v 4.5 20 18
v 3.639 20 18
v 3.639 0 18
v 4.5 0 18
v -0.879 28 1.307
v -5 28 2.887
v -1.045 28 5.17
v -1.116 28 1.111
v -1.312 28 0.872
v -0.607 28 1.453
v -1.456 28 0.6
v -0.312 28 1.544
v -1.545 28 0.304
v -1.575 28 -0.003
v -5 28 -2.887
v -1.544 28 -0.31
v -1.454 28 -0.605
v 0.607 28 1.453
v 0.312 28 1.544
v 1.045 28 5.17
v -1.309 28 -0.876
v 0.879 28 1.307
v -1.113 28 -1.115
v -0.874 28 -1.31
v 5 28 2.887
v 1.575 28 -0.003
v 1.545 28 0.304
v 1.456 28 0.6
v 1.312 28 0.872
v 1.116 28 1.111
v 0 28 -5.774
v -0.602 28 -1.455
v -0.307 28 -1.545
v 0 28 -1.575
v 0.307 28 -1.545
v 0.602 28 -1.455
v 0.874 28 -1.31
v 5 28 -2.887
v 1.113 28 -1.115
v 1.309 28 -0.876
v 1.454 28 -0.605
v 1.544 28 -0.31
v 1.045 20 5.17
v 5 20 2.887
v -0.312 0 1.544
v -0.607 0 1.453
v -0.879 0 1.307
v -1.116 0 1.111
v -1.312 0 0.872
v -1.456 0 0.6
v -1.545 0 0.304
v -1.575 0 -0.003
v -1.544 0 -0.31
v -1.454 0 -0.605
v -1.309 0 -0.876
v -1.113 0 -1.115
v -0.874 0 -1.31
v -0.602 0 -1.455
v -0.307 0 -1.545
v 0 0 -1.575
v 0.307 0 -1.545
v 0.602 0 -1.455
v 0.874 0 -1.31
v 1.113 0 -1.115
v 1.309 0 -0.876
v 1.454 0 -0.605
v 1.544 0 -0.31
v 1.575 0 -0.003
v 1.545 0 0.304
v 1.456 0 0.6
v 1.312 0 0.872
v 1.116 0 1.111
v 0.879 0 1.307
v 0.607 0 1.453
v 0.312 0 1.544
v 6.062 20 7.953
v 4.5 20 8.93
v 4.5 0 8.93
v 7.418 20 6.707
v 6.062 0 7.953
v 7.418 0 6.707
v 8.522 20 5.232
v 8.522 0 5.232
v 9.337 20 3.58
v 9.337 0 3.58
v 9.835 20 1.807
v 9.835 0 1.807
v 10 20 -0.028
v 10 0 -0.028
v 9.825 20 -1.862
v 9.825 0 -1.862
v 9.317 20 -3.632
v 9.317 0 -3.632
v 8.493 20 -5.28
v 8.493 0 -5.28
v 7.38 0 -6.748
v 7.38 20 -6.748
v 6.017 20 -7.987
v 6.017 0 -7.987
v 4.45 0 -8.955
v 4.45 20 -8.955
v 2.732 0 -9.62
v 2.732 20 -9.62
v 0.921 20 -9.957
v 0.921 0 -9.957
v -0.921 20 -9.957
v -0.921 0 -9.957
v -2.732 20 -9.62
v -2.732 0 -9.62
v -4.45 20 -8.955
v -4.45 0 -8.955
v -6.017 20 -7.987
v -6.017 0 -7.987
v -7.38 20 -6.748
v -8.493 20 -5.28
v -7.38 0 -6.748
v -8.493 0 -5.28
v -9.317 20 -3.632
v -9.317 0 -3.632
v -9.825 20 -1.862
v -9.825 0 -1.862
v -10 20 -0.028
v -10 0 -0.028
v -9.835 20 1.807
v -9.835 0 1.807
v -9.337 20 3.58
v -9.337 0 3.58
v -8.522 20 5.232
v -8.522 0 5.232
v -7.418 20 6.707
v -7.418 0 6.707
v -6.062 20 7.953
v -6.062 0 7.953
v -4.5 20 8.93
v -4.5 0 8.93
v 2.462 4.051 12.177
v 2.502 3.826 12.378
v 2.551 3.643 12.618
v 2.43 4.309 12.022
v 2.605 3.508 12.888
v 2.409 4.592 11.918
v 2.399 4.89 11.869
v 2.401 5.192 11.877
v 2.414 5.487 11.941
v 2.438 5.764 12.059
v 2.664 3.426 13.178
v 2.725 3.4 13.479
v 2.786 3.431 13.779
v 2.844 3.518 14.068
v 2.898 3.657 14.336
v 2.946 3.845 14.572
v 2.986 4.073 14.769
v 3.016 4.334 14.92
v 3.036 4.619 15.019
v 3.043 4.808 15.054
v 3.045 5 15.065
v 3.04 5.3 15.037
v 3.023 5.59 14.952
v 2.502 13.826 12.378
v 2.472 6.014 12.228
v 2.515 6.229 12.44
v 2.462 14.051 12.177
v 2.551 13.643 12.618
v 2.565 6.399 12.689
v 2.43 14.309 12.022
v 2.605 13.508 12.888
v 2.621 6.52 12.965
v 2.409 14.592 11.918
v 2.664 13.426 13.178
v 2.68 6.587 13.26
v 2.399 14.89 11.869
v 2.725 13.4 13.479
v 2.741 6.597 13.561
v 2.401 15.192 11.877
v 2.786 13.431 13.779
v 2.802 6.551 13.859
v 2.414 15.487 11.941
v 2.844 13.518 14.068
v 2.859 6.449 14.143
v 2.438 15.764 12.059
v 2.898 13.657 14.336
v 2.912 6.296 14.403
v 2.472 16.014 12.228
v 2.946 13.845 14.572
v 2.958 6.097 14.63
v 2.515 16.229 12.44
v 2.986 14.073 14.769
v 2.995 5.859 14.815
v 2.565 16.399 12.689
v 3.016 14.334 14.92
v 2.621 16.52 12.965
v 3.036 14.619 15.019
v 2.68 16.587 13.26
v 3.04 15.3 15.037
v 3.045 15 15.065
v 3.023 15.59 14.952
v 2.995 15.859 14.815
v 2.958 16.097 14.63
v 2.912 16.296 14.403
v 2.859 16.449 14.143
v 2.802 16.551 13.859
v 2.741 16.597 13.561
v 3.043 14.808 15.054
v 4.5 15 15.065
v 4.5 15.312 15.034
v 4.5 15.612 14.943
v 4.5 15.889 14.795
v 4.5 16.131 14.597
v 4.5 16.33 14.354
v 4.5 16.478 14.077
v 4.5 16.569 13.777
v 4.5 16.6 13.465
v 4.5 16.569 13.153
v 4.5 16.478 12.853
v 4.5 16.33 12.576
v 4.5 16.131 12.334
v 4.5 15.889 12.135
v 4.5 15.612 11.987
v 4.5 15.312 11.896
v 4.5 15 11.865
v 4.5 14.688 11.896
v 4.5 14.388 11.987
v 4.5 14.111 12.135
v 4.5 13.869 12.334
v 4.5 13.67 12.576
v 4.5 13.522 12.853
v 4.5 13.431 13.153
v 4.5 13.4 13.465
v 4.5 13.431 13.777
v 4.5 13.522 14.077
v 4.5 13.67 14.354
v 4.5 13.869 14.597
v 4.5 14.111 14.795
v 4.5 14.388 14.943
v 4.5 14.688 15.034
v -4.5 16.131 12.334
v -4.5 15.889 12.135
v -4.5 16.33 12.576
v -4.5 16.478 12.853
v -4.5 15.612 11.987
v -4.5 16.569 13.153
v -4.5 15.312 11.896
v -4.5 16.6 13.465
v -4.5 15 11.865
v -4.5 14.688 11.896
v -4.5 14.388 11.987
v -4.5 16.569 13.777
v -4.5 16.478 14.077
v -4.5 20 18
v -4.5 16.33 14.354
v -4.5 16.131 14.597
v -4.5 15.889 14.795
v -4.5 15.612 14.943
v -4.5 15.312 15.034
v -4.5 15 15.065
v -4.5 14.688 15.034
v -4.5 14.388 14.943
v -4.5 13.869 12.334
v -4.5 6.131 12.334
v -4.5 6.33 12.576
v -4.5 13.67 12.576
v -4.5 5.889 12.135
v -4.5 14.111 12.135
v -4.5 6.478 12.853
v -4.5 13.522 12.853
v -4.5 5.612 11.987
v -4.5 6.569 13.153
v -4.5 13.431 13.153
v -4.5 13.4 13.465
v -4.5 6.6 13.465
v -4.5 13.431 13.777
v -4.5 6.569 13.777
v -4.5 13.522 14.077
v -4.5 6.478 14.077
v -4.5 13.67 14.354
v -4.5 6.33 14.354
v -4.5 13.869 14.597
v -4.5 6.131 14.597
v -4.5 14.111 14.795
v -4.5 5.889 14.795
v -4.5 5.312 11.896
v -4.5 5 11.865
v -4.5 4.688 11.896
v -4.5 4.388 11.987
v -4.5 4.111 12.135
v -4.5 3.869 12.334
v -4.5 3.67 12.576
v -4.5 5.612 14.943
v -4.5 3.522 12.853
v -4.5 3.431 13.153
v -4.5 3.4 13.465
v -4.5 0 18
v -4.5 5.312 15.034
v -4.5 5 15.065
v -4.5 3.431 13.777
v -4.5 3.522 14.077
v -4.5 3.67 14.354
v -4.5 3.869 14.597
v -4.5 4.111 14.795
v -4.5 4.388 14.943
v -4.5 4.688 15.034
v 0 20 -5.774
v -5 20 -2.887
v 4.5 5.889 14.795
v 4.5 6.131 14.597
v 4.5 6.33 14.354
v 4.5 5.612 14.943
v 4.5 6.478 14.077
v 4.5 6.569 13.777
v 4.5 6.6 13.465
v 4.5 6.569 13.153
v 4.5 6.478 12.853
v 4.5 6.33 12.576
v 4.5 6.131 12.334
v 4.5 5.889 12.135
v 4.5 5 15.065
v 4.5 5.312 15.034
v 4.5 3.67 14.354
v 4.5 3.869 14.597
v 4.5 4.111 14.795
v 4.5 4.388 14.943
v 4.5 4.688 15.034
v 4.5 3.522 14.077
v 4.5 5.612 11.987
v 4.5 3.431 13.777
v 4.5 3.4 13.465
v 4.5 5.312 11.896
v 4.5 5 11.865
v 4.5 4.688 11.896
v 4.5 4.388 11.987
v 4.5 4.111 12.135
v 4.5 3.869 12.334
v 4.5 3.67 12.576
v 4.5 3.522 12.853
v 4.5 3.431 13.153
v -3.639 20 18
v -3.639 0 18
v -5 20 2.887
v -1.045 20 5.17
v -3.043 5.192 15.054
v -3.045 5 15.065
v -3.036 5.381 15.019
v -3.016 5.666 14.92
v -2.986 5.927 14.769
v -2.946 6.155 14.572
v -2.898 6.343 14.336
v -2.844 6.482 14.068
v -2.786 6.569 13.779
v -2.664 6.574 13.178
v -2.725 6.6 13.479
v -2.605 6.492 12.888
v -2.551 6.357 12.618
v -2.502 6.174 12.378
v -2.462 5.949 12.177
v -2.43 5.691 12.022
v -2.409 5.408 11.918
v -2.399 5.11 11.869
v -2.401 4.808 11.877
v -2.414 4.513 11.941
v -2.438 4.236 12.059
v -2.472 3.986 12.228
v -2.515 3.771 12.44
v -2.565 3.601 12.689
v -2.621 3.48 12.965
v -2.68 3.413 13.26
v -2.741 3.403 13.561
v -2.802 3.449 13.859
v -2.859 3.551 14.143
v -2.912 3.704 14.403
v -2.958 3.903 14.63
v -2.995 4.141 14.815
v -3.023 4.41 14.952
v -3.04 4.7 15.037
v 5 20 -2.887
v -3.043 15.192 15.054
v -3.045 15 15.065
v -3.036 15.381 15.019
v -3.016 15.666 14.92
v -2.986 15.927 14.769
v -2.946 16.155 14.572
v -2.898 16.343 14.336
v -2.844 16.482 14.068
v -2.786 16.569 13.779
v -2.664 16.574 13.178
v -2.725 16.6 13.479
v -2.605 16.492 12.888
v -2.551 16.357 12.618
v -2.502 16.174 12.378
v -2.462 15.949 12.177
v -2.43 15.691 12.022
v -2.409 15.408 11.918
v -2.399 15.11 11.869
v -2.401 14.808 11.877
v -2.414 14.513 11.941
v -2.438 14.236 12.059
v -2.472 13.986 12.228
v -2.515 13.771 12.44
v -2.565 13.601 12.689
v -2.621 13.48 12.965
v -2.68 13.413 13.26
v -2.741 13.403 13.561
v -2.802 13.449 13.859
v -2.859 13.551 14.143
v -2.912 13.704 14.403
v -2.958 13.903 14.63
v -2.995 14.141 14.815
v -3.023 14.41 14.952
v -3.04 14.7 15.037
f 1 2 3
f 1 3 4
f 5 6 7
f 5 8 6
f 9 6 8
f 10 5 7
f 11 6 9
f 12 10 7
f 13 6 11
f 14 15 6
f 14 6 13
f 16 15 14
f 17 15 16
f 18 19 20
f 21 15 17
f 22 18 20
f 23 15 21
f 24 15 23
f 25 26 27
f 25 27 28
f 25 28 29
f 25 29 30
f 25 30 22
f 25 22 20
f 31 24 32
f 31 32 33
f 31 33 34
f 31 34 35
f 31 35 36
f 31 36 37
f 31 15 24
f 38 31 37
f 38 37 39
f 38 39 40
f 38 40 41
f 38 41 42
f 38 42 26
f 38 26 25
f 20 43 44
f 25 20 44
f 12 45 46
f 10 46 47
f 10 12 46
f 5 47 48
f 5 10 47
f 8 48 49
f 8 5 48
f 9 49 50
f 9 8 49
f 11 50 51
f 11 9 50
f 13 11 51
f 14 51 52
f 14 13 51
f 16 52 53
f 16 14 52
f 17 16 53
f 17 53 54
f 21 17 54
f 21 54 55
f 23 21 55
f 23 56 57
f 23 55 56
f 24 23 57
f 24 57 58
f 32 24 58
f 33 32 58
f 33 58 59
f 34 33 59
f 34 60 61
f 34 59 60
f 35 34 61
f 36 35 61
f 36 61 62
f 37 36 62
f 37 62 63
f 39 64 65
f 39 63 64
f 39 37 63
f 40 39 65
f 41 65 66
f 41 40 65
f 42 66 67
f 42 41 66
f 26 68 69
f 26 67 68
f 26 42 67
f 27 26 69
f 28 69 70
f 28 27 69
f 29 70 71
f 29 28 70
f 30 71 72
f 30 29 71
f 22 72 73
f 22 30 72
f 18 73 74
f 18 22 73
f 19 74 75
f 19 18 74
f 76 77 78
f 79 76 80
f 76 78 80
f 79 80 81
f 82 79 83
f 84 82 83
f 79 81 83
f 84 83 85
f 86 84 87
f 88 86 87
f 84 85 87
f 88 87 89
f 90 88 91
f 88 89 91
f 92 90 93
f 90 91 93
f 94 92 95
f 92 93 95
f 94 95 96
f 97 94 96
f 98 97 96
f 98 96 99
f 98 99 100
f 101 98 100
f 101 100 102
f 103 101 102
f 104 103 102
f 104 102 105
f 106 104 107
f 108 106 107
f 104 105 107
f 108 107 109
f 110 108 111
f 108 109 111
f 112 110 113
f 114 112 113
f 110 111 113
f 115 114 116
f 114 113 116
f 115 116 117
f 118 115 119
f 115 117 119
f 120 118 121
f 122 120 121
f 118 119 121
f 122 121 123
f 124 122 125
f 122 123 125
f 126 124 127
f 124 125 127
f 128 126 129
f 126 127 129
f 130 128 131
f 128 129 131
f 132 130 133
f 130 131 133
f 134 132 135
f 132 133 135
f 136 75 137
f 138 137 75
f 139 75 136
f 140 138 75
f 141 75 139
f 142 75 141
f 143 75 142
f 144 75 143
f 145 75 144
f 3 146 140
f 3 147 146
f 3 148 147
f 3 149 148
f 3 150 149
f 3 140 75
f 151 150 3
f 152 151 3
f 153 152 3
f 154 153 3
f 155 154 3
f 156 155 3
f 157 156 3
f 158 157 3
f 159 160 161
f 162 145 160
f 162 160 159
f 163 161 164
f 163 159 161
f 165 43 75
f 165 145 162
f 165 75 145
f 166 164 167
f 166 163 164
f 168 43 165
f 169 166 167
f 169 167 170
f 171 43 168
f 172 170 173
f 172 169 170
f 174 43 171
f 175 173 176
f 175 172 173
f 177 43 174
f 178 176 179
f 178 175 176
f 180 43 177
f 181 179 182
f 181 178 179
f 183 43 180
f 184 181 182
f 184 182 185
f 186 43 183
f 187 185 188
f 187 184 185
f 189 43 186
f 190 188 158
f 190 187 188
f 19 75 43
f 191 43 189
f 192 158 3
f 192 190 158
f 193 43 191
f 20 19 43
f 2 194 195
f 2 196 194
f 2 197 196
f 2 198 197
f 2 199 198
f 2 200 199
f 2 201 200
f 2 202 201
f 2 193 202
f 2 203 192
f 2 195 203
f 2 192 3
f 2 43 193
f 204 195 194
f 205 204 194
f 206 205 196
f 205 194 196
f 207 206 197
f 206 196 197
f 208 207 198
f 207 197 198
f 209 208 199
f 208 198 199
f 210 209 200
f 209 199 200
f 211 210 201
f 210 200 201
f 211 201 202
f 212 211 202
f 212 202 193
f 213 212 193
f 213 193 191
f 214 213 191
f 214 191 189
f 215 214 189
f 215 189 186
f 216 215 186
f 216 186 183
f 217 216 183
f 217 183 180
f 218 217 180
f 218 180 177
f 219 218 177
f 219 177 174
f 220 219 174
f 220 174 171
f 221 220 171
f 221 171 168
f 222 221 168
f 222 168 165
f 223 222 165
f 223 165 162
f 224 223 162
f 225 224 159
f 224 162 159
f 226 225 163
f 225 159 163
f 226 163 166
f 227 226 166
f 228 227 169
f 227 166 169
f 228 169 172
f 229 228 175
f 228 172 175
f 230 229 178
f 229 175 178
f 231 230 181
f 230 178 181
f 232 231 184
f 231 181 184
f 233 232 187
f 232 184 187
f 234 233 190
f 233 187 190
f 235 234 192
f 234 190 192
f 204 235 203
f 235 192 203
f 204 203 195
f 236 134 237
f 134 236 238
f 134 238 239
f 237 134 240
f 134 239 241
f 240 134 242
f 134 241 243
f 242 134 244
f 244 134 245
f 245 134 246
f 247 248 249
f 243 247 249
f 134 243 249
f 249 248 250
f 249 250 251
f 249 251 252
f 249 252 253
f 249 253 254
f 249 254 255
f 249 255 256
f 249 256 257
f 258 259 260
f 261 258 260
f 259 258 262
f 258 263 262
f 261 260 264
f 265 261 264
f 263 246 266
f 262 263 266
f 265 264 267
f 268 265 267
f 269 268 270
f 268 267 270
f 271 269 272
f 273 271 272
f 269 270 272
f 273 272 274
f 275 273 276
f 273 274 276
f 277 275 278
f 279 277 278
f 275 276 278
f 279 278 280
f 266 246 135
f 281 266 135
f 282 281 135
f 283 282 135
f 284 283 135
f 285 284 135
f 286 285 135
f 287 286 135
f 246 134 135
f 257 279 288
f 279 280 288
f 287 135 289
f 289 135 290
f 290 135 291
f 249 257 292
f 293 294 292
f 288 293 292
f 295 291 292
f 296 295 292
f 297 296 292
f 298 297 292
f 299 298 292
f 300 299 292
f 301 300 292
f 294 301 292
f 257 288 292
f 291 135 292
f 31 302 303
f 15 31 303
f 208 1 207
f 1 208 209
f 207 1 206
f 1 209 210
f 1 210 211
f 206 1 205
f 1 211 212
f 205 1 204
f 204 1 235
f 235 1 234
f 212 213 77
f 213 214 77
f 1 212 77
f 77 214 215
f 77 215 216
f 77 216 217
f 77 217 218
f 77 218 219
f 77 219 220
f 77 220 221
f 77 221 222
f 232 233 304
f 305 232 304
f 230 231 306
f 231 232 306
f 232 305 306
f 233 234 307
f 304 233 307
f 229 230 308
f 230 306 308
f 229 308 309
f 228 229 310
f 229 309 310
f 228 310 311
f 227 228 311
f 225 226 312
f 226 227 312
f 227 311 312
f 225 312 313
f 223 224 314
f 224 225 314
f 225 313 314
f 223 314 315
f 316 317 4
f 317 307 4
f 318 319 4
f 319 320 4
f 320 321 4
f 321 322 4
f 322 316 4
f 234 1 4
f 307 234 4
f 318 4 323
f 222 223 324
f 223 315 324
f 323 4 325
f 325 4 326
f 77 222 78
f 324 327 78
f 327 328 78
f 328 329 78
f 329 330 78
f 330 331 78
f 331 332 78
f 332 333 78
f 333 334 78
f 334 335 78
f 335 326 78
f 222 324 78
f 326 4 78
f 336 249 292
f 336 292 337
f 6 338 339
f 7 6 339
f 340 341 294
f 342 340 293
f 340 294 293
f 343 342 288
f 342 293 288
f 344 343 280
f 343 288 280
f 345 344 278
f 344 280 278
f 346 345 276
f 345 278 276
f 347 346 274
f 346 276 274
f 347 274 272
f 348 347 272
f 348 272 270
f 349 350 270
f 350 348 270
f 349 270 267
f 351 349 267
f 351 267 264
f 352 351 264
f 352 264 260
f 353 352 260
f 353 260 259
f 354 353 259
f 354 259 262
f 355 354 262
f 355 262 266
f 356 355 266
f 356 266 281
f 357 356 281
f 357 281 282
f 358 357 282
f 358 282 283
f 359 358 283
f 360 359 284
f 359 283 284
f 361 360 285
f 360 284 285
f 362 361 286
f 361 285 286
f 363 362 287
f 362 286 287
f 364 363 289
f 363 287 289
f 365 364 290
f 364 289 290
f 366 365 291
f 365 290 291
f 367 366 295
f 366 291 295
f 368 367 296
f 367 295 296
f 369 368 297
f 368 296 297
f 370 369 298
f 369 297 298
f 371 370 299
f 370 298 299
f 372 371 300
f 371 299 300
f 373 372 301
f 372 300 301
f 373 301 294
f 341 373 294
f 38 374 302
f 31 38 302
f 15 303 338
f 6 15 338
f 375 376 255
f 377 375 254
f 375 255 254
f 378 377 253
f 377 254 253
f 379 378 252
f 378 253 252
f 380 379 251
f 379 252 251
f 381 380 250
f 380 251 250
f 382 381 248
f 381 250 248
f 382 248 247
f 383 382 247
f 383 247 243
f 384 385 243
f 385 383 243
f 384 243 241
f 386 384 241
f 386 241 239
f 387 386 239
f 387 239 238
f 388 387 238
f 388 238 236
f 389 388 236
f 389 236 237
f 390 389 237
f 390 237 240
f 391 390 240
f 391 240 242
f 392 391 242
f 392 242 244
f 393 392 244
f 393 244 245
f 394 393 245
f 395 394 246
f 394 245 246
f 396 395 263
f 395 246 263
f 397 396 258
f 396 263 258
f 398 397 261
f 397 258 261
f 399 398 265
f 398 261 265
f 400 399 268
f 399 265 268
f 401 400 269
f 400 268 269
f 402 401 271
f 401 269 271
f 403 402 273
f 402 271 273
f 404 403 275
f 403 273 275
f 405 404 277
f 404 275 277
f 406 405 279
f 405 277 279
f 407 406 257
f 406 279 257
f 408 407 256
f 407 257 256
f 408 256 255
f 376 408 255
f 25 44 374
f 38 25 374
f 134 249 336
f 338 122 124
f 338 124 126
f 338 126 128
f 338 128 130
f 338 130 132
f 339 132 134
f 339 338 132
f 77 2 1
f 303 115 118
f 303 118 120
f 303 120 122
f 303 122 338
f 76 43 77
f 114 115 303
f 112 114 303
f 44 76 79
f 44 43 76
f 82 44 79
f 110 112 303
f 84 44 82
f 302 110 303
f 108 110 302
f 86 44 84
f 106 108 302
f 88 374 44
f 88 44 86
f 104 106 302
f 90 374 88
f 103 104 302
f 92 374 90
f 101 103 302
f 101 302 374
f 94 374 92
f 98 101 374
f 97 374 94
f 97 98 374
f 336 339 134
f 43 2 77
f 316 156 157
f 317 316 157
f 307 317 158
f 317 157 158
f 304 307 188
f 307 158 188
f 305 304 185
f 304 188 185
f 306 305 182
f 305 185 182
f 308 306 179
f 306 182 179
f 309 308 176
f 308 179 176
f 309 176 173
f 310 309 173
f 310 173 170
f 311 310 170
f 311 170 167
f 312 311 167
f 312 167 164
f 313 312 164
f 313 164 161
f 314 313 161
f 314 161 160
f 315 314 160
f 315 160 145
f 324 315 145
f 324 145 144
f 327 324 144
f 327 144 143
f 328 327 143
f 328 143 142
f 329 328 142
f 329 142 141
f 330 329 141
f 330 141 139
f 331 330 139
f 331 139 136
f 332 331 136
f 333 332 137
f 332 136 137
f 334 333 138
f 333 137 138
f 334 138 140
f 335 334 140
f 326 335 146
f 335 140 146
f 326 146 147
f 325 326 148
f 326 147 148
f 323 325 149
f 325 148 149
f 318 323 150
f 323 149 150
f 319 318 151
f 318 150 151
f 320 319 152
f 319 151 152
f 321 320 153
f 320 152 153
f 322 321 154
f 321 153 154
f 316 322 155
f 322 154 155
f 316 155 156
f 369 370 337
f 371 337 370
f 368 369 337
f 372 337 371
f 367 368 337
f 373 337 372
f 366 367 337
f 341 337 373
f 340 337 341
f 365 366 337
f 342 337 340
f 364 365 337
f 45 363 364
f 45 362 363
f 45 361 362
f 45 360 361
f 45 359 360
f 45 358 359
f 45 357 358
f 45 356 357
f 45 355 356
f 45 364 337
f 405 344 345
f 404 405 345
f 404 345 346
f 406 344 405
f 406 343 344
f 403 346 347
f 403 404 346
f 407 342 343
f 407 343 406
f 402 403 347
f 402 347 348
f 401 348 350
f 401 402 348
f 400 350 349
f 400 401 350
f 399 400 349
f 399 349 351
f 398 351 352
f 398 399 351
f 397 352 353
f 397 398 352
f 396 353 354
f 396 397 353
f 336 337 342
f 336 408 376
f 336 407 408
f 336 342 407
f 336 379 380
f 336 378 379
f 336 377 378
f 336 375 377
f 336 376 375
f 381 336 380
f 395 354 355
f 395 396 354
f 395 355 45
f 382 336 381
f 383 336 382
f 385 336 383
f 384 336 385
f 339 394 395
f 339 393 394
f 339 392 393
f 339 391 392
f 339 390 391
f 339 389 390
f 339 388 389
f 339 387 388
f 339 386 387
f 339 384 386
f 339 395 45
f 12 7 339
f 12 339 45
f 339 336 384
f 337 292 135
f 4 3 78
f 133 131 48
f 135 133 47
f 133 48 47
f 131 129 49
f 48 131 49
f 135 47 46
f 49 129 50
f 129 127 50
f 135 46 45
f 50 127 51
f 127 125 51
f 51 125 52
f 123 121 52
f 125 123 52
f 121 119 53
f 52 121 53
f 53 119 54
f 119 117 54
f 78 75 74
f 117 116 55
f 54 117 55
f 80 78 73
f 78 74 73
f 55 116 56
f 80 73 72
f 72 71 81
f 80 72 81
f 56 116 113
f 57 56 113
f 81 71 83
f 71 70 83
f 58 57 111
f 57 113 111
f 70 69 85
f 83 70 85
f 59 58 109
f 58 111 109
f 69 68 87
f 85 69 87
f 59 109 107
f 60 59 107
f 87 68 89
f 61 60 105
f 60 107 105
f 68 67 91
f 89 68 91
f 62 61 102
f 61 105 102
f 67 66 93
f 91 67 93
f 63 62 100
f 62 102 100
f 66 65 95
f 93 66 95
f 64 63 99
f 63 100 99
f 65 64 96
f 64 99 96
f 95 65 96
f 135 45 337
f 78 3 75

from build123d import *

# Parameters (mm, degrees)
EXTRUDE_1_DEPTH     = 20
EXTRUDE_2_DEPTH     = 8
CUT_EXTRUDE_1_DEPTH = 35.756294394
SKETCH_4_R          = 1.6
CUT_EXTRUDE_2_DEPTH = 37.307712679


with BuildPart() as part:
    # ｽｹｯﾁ1 → ﾎﾞｽ - 押し出し1 (new body)
    with BuildSketch(Plane(origin=(0, 0, 0), x_dir=(1, 0, 0), z_dir=(0, 1, 0))):
        with BuildLine():
            Line((-4.5, -8.93028555), (-4.5, -18))
            Line((-4.5, -18), (4.5, -18))
            Line((4.5, -18), (4.5, -8.93028555))
            ThreePointArc((4.5, -8.93028555), (0, 10), (-4.5, -8.93028555))
        make_face()
    extrude(amount=EXTRUDE_1_DEPTH)

    # ｽｹｯﾁ2 → ﾎﾞｽ - 押し出し2 (add)
    with BuildSketch(Plane(origin=(0, 20, 0), x_dir=(1, 0, 0), z_dir=(0, 1, 0))):
        Polygon((0, 5.773502692), (-5, 2.886751346), (-5, -2.886751346), (0, -5.773502692), (5, -2.886751346), (5, 2.886751346), align=None)
    extrude(amount=EXTRUDE_2_DEPTH)

    # ｽｹｯﾁ3 → ｶｯﾄ - 押し出し1 (cut, through all)
    with BuildSketch(Plane(origin=(0, 28, 0), x_dir=(1, 0, 0), z_dir=(0, 1, 0))):
        with BuildLine():
            Line((-3.638778503, -18), (-0.312080176, -1.543771668))
            ThreePointArc((-0.312080176, -1.543771668), (0, 1.575), (0.312080176, -1.543771668))
            Line((0.312080176, -1.543771668), (3.638778503, -18))
            ThreePointArc((3.638778503, -18), (0, -18.364114708), (-3.638778503, -18))
        make_face()
    extrude(amount=-CUT_EXTRUDE_1_DEPTH, mode=Mode.SUBTRACT)

    # ｽｹｯﾁ4 → ｶｯﾄ - 押し出し2 (cut, through all)
    with BuildSketch(Plane.ZY.offset(4.5)):
        with Locations((13.465142775, 15)):
            Circle(SKETCH_4_R)
        with Locations((13.465142775, 5)):
            Circle(SKETCH_4_R)
    extrude(amount=-CUT_EXTRUDE_2_DEPTH, mode=Mode.SUBTRACT)


solid = part.part
